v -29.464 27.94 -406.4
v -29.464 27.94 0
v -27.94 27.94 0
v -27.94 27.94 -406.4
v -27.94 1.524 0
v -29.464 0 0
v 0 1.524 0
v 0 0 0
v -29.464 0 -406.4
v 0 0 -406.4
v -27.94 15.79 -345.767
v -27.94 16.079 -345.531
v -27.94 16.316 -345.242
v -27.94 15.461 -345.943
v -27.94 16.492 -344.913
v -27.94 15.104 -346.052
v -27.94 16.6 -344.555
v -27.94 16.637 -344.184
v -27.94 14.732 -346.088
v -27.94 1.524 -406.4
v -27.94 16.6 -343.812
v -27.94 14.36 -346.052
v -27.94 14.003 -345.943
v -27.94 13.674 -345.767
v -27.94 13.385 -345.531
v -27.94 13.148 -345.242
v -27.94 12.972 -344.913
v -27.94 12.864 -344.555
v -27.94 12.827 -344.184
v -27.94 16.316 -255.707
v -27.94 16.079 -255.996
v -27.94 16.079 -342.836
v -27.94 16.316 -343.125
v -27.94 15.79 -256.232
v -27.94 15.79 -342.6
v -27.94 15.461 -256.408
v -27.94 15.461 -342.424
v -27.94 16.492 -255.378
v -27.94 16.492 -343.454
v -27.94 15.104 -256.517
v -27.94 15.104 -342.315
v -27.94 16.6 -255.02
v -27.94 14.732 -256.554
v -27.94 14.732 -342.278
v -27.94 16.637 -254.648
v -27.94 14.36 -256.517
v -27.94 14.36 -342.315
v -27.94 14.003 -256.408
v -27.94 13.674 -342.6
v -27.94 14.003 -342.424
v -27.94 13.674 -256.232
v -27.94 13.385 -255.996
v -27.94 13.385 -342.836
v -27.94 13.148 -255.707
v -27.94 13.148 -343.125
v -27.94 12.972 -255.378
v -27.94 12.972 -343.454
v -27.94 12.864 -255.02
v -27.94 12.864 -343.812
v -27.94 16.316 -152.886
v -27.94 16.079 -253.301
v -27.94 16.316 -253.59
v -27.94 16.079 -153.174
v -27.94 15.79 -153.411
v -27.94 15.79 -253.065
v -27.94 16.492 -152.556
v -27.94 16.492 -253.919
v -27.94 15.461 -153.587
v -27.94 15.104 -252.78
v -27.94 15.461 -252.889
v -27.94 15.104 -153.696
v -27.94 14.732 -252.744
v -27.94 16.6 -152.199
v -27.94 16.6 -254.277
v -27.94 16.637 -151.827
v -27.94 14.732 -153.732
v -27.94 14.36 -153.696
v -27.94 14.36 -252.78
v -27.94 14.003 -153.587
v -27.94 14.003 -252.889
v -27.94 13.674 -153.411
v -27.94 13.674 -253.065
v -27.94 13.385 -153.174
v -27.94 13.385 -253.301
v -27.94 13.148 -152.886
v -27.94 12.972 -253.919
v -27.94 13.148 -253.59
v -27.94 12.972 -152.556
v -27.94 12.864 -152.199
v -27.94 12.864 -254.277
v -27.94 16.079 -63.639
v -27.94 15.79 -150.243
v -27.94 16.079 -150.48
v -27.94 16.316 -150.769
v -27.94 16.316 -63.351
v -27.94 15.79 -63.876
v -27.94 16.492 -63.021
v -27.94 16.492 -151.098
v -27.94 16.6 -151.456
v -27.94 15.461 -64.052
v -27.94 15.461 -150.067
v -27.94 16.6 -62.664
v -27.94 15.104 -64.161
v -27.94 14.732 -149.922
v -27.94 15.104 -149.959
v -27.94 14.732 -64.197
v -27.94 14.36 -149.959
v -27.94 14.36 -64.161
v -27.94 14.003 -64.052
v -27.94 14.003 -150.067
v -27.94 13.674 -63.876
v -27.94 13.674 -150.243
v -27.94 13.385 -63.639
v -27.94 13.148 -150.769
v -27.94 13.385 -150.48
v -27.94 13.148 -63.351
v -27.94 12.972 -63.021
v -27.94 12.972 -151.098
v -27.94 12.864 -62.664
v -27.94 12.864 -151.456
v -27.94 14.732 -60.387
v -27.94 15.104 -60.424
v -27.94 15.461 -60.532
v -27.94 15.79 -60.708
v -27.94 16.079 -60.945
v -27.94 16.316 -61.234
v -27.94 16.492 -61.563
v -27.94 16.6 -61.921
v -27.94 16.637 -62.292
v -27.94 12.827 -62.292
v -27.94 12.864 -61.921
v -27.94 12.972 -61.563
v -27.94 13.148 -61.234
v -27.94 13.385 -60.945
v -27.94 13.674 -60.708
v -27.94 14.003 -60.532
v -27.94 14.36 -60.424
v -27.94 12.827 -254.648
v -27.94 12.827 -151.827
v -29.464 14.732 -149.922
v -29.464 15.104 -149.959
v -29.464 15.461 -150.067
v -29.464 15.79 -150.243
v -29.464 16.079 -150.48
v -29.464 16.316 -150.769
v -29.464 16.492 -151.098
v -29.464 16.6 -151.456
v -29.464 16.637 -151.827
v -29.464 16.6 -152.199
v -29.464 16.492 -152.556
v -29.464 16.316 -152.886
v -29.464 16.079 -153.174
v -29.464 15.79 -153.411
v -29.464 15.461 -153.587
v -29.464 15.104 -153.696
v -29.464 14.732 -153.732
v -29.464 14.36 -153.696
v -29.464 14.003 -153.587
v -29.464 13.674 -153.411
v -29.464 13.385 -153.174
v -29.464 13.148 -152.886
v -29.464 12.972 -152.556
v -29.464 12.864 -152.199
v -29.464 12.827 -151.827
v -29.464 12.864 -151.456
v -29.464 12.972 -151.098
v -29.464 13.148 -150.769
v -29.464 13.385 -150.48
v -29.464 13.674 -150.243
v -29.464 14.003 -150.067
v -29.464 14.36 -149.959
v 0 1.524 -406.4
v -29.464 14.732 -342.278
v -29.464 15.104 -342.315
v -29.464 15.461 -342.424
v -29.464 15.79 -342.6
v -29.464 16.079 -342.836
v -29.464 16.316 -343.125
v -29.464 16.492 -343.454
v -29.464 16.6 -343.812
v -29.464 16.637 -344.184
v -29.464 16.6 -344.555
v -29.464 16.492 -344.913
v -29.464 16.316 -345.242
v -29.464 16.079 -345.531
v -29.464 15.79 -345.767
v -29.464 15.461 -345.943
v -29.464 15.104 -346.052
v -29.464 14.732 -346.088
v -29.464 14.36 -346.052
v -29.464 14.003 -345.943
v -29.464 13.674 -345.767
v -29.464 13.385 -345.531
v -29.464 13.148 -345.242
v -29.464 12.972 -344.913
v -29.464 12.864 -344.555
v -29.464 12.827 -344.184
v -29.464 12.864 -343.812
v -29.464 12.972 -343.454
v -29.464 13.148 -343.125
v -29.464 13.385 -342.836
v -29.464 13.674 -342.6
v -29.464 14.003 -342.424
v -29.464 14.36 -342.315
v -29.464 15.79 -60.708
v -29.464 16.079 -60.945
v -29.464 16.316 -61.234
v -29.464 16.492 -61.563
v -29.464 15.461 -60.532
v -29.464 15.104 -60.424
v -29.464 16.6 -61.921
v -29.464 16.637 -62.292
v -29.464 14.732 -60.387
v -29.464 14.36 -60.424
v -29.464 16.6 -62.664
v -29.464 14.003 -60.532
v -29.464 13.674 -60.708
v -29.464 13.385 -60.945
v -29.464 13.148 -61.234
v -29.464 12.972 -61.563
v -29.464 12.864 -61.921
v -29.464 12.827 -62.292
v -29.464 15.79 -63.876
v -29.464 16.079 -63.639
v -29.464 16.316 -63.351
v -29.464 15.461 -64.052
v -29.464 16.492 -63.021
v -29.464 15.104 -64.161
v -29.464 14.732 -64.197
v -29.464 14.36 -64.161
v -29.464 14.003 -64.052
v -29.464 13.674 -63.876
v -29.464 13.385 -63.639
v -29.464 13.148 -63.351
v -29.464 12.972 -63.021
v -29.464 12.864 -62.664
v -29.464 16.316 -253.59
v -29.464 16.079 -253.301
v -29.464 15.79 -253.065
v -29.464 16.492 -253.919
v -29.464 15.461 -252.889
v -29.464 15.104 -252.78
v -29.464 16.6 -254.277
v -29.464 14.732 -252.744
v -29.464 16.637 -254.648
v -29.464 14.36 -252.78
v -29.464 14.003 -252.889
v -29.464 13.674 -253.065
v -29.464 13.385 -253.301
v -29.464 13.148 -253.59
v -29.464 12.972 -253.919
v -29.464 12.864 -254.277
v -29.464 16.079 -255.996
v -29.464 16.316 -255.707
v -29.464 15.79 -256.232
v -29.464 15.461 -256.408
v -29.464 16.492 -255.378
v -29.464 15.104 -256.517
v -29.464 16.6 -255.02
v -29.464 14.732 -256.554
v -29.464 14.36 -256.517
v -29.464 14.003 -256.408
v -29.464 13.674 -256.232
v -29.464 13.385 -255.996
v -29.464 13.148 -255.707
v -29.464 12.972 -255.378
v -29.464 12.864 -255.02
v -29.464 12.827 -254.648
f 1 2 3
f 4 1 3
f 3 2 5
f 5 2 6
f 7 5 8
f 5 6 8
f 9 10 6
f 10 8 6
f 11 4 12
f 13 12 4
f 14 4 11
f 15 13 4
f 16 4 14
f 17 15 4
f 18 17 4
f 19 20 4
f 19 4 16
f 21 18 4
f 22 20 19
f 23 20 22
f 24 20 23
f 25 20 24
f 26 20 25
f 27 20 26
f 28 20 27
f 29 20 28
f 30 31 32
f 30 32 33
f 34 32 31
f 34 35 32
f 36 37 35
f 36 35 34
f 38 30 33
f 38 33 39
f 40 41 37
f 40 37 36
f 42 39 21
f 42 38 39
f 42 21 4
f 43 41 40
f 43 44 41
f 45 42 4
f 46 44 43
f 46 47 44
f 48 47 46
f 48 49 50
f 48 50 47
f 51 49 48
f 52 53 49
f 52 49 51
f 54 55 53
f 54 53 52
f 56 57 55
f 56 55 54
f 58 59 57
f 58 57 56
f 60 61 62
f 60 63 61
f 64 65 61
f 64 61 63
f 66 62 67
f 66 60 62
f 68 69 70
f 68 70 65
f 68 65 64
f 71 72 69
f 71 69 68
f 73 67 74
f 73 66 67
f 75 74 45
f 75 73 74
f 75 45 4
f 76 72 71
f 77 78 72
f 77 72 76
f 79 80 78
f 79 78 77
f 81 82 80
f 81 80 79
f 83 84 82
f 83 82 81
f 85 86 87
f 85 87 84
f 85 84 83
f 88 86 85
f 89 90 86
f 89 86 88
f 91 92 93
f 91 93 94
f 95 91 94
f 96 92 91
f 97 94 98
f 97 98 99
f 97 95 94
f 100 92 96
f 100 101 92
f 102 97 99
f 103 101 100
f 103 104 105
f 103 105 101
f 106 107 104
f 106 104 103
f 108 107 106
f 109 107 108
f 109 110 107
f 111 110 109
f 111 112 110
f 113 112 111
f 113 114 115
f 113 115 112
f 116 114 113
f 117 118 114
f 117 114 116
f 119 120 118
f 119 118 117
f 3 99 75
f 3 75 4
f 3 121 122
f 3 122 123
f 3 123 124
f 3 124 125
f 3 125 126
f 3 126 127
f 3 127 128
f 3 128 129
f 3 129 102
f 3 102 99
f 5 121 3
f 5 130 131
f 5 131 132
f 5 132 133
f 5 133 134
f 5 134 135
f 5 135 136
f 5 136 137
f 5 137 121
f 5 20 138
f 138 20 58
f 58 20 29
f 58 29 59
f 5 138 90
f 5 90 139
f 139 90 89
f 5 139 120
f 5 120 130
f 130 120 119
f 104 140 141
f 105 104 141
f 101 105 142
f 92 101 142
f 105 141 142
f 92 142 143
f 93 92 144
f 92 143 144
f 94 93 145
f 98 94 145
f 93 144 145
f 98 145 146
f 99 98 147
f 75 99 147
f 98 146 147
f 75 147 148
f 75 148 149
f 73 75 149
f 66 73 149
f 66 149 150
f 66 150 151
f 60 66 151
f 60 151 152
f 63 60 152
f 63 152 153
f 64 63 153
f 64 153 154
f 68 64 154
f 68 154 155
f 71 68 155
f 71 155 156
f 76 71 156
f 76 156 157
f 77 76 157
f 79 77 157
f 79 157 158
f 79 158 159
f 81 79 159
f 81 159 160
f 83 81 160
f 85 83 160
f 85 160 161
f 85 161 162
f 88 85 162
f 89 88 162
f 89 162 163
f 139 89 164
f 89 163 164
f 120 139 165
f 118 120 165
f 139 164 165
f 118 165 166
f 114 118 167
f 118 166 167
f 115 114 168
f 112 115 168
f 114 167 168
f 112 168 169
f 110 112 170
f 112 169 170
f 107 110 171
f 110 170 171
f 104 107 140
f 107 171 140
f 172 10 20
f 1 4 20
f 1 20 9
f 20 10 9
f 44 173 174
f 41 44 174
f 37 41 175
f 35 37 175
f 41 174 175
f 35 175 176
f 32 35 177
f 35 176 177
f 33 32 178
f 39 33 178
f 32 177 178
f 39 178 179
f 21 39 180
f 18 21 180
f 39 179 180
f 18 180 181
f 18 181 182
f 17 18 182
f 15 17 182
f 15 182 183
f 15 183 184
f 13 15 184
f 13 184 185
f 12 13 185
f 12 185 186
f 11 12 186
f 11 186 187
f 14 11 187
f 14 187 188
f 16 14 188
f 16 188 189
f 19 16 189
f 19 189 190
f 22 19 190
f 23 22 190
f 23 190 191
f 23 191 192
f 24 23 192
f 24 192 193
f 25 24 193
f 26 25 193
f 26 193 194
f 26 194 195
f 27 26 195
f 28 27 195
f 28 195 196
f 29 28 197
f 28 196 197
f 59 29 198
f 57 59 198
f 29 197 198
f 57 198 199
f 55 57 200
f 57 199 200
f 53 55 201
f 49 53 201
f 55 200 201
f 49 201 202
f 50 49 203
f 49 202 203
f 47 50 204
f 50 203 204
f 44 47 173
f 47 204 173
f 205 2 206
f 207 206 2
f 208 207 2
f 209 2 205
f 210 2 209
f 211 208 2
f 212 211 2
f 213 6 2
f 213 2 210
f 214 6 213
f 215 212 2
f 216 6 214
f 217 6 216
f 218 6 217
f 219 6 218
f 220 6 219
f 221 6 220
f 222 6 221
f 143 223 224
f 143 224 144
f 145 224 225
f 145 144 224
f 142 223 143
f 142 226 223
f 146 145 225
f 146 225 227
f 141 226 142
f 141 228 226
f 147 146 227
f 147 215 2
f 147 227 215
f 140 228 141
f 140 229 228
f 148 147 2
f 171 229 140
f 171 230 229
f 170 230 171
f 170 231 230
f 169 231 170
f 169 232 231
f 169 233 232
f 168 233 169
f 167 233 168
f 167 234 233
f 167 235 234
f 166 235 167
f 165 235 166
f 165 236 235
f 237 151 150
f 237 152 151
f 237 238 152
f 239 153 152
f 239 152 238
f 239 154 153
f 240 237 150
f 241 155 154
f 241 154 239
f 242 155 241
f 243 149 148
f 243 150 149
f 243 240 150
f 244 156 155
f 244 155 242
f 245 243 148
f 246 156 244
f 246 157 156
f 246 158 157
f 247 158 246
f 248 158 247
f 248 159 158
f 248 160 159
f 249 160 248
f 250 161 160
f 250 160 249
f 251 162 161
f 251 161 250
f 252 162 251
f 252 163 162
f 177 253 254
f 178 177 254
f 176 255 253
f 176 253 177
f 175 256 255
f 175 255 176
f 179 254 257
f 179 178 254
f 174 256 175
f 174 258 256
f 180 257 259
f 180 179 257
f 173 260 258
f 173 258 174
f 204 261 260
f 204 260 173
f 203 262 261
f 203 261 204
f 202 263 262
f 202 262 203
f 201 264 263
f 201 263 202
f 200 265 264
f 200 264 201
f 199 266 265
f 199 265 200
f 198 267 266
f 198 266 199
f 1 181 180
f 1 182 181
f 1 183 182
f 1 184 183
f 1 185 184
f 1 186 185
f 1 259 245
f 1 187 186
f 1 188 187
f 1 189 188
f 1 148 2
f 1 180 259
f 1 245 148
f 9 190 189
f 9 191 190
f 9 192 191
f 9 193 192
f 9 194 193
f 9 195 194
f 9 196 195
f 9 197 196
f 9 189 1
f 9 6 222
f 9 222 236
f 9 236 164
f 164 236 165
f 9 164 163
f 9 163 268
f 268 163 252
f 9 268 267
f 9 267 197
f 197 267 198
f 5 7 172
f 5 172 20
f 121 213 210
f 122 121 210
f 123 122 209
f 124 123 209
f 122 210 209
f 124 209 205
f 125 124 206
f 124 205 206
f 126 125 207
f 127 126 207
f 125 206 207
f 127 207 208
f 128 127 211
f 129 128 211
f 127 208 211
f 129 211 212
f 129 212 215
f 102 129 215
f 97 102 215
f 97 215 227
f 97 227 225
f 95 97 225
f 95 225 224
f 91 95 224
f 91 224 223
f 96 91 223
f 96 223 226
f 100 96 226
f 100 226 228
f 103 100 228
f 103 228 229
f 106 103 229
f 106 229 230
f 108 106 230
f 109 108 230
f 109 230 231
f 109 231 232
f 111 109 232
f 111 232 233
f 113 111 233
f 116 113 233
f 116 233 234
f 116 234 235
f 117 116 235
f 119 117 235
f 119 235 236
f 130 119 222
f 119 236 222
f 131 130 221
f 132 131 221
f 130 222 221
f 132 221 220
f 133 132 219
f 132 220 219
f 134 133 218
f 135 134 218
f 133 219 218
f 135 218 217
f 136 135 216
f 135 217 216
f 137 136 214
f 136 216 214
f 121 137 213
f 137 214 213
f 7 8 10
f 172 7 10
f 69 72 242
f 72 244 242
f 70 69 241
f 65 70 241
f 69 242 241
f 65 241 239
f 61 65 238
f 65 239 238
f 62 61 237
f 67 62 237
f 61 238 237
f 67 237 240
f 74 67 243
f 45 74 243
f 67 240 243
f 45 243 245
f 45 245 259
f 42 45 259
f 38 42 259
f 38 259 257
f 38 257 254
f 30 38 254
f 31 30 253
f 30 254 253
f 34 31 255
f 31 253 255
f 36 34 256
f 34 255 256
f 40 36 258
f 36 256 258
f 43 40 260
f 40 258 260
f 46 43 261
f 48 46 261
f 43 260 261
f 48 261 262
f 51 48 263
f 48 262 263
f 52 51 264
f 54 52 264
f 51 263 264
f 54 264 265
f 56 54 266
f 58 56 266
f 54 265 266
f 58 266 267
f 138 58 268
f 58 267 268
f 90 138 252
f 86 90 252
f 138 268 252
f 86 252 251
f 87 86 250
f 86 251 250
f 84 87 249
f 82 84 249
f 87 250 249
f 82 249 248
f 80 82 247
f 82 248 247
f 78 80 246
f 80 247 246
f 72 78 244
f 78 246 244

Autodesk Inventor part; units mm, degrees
ref_plane "YZ Plane" through (0, 0, 0) normal (1, 0, 0) x (0, 1, 0)
ref_plane "XZ Plane" through (0, 0, 0) normal (0, 1, 0) x (-1, 0, 0)
ref_plane "XY Plane" through (0, 0, 0) normal (0, 0, 1) x (1, 0, 0)
sketch "Sketch1" plane through (0, 0, 0) normal (0, 1, 0) x (-1, 0, 0)
  line L0 (0, 0) -> (0, -406.4)
  line L1 (0, -406.4) -> (27.94, -406.4)
  line L2 (27.94, -406.4) -> (27.94, 0)
  line L3 (27.94, 0) -> (0, 0)
  dimension "d0" = 406.4
  dimension "d1" = 27.94
extrude "Extrusion1" add sketch "Sketch1" along normal blind 1.524
sketch "Sketch2" plane through (0, 0, 0) normal (0, -1, 0) x (1, 0, 0)
  line L0 (-27.94, 0) -> (0, 0) projected
  line L1 (-27.94, 0) -> (-29.464, 0)
  line L2 (-29.464, 0) -> (-29.464, -406.4)
  line L3 (0, -406.4) -> (-27.94, -406.4) projected
  line L4 (-29.464, -406.4) -> (-27.94, -406.4)
  line L5 (-27.94, -406.4) -> (-27.94, 0) projected
  line L6 (-27.94, -406.4) -> (-27.94, 0)
  dimension "d4" = 1.524
extrude "Extrusion2" add sketch "Sketch2" against normal blind 27.94
sketch "Sketch3" plane through (-29.464, 0, -406.4) normal (-1, 0, 0) x (0, 0, 1)
  line L0 (406.4, 1.524) -> (0, 1.524) projected
  line L1 (203.2, 1.524) -> (166.37, 1.524)
  line L2 (203.2, 1.524) -> (240.03, 1.524)
  point P0 (406.4, 0)
  dimension "d7" = 36.83
  dimension "d8" = 36.83
sketch "Sketch4" plane through (-29.464, 0, -406.4) normal (-1, 0, 0) x (0, 0, 1)
  line L0 (0, 1.524) -> (0, 27.94) projected
  line L1 (0, 14.732) -> (406.4, 14.732)
  line L2 (406.4, 1.524) -> (406.4, 27.94) projected
  point P0 (406.4, 0)
sketch "Sketch6" plane through (-29.464, 0, -406.4) normal (-1, 0, 0) x (0, 0, 1)
  circle A0 centre (344.1078, 14.732) radius 1.905
  circle A1 centre (254.5728, 14.732) radius 1.905
  circle A2 centre (151.7515, 14.732) radius 1.905
  circle A3 centre (62.2165, 14.732) radius 1.905
  point P0 (406.4, 0)
extrude "Extrusion4" cut sketch "Sketch6" against normal blind 17.4625
properties part number "Flywheel Headpiece" material "Steel, Alloy"
